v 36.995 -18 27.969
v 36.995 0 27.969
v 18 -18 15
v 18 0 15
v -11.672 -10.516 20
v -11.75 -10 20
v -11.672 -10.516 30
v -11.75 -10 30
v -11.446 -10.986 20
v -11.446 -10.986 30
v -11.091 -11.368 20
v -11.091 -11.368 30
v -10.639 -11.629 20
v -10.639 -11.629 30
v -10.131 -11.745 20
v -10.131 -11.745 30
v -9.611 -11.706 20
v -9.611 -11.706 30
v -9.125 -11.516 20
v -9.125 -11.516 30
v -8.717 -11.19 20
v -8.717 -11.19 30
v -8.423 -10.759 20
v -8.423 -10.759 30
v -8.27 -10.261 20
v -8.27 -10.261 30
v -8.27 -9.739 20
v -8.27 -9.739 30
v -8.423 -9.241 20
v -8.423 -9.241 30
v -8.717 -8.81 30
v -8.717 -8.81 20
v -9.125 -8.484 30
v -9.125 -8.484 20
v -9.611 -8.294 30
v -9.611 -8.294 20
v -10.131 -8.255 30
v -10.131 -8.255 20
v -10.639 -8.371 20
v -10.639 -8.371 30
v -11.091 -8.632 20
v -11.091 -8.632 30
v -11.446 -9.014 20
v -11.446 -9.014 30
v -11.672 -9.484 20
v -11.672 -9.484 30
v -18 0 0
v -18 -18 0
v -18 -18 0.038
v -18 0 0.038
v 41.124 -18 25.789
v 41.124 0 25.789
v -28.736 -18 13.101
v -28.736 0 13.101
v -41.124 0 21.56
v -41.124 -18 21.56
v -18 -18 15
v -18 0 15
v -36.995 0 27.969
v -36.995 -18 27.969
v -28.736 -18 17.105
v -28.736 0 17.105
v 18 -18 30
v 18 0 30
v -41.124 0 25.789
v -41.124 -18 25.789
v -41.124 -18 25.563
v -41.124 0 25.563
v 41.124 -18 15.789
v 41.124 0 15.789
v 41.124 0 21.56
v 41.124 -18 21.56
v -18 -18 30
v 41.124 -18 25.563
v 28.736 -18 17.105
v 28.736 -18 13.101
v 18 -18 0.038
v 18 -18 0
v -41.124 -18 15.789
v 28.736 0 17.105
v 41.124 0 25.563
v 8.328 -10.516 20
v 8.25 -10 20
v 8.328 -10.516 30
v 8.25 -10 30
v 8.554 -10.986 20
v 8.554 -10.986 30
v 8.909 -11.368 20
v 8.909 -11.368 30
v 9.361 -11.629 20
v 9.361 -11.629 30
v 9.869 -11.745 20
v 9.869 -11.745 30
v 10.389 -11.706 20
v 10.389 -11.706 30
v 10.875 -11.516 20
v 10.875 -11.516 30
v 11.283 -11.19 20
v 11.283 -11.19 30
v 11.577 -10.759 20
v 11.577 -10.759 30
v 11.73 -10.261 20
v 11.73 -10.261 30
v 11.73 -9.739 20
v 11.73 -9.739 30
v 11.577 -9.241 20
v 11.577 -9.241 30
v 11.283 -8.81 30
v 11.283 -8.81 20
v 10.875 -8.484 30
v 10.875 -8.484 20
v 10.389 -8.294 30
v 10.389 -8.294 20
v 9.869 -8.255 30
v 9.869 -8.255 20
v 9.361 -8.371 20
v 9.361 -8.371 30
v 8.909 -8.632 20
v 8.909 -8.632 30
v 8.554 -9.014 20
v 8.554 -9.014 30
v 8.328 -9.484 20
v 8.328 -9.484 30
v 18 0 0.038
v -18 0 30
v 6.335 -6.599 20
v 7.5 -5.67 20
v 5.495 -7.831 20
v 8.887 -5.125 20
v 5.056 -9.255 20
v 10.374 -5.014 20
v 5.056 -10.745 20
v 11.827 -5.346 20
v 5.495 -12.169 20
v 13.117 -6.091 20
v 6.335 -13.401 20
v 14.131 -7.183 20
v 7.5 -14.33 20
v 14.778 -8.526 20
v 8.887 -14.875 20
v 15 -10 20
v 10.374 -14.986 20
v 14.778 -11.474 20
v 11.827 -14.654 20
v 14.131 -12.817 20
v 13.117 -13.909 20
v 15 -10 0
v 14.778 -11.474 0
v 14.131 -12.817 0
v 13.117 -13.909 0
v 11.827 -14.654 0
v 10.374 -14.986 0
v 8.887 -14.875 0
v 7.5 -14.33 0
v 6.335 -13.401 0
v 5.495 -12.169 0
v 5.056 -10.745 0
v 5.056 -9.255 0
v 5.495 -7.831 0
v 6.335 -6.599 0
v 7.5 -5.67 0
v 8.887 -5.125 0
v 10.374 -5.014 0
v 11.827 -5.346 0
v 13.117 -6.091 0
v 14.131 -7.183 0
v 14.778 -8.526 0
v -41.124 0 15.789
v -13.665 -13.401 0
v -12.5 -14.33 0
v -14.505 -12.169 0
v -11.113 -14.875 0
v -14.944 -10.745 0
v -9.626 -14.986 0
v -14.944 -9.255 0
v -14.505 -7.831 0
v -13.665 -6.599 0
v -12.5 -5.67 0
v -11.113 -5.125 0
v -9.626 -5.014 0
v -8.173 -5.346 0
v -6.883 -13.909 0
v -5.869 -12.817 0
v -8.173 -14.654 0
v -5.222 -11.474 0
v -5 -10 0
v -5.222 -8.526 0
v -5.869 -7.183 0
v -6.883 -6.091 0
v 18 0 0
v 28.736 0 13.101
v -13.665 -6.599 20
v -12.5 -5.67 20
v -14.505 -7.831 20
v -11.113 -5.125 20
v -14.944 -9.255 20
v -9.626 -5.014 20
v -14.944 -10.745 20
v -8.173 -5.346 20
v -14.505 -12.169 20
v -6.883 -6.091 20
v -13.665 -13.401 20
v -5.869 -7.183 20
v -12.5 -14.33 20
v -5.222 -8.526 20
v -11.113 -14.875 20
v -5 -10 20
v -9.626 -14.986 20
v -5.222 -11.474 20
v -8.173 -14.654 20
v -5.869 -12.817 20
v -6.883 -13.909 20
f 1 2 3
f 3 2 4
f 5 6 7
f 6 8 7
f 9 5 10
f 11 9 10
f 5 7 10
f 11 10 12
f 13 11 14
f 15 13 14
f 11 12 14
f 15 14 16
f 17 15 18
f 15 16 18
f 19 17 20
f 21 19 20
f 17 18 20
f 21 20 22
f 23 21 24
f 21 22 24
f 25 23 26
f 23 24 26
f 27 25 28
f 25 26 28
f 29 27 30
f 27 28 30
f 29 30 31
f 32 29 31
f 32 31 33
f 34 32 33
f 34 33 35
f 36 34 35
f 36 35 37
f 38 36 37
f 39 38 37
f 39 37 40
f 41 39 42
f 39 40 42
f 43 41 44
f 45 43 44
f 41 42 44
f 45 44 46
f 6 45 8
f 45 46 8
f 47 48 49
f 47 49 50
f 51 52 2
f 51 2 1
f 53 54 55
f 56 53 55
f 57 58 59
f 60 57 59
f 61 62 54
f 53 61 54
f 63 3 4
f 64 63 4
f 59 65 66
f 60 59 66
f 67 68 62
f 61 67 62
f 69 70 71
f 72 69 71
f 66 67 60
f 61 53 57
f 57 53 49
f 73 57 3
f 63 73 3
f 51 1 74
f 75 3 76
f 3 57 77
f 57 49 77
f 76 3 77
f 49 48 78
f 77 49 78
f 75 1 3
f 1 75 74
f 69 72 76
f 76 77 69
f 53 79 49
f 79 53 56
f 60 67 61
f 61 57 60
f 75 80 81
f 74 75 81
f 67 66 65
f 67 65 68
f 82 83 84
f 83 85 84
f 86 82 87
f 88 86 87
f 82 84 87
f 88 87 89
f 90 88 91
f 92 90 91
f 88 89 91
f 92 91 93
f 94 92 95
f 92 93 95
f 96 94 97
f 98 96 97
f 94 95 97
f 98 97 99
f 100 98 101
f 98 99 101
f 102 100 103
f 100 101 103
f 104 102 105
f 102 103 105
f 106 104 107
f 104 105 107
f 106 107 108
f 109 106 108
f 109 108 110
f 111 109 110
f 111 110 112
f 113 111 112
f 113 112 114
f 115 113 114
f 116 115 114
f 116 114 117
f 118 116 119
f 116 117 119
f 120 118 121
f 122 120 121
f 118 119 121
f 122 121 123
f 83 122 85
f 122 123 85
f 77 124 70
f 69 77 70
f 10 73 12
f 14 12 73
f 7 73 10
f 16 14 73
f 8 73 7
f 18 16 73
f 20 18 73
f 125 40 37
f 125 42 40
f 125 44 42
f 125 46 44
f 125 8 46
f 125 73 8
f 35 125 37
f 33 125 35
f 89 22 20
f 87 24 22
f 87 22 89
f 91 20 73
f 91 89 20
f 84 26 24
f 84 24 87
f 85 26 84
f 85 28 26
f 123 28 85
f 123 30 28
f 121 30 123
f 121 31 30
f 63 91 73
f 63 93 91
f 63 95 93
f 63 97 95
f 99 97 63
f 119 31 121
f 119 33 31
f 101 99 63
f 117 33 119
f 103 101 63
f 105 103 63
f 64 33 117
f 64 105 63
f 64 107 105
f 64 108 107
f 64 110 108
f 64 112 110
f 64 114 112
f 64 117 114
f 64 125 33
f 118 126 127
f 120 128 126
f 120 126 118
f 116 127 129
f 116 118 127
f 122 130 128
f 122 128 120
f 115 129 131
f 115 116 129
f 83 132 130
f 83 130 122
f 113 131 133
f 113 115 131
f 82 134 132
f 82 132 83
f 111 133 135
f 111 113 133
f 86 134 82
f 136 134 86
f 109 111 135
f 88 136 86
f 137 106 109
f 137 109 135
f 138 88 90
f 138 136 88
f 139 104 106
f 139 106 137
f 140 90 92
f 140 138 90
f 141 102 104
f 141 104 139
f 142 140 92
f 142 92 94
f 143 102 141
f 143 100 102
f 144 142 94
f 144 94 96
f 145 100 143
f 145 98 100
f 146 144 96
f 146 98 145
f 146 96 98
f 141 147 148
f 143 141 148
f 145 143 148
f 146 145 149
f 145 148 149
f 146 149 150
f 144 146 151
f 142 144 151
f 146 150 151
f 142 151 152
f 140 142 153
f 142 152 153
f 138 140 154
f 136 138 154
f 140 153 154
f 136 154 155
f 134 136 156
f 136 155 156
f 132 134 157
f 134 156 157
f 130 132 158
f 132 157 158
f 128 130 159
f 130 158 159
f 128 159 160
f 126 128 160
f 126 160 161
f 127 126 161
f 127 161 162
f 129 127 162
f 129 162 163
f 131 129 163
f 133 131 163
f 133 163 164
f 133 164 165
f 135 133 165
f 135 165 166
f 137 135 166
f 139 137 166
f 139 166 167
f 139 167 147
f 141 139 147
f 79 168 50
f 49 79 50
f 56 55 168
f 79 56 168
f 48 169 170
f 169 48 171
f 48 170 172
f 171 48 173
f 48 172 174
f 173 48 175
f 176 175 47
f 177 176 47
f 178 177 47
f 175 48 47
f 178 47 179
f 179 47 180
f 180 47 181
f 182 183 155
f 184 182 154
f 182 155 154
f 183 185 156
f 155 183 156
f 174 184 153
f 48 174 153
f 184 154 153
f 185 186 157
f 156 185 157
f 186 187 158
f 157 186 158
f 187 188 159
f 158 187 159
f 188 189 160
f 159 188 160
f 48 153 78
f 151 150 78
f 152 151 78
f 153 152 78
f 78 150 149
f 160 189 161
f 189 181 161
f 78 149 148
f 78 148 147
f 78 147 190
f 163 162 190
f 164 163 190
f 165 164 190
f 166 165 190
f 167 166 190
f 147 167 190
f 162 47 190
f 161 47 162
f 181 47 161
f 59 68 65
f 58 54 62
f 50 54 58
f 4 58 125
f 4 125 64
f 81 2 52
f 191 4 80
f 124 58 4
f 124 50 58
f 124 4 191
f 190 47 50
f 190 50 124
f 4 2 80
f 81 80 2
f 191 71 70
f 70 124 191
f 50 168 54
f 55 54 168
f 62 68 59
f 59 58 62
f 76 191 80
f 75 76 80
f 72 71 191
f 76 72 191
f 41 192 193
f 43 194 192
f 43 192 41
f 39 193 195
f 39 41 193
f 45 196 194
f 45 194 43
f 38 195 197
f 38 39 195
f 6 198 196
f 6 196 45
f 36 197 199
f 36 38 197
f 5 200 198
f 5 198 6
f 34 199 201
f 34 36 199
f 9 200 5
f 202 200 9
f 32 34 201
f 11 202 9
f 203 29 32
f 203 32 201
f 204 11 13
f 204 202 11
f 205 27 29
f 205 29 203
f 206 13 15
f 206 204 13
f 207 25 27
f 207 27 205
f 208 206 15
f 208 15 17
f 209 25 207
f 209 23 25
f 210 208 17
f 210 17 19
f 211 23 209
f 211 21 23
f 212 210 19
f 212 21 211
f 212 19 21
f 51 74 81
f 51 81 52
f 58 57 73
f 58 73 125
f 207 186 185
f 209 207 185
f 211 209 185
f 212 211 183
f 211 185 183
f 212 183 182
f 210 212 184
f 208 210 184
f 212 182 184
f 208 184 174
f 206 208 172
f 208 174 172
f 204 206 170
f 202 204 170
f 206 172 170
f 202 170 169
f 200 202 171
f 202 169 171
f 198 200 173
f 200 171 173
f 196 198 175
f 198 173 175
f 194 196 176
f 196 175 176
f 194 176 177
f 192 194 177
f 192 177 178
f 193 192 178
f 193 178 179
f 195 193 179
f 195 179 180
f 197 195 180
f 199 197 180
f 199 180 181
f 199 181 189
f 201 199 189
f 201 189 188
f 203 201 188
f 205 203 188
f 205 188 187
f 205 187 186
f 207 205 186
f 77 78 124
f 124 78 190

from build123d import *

# Parameters (mm, degrees)
F0_W           = 36
F0_H           = 18
F1_DEPTH       = 15
F3_DEPTH       = 18
F4_DEPTH       = 15
F5_SIZE        = 5
F6_D           = 3.5
F6_CBORE_D     = 10
F6_CBORE_DEPTH = 20


# Not quite as in the source:
# - a feature names something its author has since deleted; it is built from what else it names


with BuildPart() as f1:
    # F0 (on Top) → F1 (new body)
    with BuildSketch(Plane.XY):
        with Locations((0, -9)):
            Rectangle(F0_W, F0_H)
    extrude(amount=F1_DEPTH)

    # F2 (on Front) → F3 (join)
    with BuildSketch(Plane.XZ):
        Polygon((-17.9443880916, 0), (-18, 15), (-41.1238394028, 30.7888584537), (-41.1238394028, 25.5634840578), (-28.7360682942, 17.105167029), (-28.7360682942, 13.1013058126), (-41.1238394028, 21.5596228414), (-41.1238394028, 15.7888584537), align=None)
        Polygon((28.7360682942, 17.105167029), (41.1238394028, 25.5634840578), (41.1238394028, 30.7888584537), (18, 15), (17.9443880916, 0), (41.1238394028, 15.7888584537), (41.1238394028, 21.5596228414), (28.7360682942, 13.1013058126), align=None)
    extrude(amount=F3_DEPTH)

    # F4 (add): a face of the model
    f4_faces = [f1.faces().sort_by_distance(p)[0] for p in [
        (0, -9, 15),
    ]]
    extrude(f4_faces, amount=F4_DEPTH)

    # F5
    f5_edges = [f1.edges().sort_by_distance(p)[0] for p in [
        (41.123839, -9, 30.788858),
        (-41.123839, -9, 30.788858),
    ]]
    chamfer(f5_edges, length=F5_SIZE)

    # F6 (through all)
    with Locations(Plane(origin=(0, 0, 0), x_dir=(1, 0, 0), z_dir=(0, 0, -1))):
        with Locations((-10, 10), (10, 10)):
            CounterBoreHole(F6_D / 2, F6_CBORE_D / 2, F6_CBORE_DEPTH)


solid = f1.part
